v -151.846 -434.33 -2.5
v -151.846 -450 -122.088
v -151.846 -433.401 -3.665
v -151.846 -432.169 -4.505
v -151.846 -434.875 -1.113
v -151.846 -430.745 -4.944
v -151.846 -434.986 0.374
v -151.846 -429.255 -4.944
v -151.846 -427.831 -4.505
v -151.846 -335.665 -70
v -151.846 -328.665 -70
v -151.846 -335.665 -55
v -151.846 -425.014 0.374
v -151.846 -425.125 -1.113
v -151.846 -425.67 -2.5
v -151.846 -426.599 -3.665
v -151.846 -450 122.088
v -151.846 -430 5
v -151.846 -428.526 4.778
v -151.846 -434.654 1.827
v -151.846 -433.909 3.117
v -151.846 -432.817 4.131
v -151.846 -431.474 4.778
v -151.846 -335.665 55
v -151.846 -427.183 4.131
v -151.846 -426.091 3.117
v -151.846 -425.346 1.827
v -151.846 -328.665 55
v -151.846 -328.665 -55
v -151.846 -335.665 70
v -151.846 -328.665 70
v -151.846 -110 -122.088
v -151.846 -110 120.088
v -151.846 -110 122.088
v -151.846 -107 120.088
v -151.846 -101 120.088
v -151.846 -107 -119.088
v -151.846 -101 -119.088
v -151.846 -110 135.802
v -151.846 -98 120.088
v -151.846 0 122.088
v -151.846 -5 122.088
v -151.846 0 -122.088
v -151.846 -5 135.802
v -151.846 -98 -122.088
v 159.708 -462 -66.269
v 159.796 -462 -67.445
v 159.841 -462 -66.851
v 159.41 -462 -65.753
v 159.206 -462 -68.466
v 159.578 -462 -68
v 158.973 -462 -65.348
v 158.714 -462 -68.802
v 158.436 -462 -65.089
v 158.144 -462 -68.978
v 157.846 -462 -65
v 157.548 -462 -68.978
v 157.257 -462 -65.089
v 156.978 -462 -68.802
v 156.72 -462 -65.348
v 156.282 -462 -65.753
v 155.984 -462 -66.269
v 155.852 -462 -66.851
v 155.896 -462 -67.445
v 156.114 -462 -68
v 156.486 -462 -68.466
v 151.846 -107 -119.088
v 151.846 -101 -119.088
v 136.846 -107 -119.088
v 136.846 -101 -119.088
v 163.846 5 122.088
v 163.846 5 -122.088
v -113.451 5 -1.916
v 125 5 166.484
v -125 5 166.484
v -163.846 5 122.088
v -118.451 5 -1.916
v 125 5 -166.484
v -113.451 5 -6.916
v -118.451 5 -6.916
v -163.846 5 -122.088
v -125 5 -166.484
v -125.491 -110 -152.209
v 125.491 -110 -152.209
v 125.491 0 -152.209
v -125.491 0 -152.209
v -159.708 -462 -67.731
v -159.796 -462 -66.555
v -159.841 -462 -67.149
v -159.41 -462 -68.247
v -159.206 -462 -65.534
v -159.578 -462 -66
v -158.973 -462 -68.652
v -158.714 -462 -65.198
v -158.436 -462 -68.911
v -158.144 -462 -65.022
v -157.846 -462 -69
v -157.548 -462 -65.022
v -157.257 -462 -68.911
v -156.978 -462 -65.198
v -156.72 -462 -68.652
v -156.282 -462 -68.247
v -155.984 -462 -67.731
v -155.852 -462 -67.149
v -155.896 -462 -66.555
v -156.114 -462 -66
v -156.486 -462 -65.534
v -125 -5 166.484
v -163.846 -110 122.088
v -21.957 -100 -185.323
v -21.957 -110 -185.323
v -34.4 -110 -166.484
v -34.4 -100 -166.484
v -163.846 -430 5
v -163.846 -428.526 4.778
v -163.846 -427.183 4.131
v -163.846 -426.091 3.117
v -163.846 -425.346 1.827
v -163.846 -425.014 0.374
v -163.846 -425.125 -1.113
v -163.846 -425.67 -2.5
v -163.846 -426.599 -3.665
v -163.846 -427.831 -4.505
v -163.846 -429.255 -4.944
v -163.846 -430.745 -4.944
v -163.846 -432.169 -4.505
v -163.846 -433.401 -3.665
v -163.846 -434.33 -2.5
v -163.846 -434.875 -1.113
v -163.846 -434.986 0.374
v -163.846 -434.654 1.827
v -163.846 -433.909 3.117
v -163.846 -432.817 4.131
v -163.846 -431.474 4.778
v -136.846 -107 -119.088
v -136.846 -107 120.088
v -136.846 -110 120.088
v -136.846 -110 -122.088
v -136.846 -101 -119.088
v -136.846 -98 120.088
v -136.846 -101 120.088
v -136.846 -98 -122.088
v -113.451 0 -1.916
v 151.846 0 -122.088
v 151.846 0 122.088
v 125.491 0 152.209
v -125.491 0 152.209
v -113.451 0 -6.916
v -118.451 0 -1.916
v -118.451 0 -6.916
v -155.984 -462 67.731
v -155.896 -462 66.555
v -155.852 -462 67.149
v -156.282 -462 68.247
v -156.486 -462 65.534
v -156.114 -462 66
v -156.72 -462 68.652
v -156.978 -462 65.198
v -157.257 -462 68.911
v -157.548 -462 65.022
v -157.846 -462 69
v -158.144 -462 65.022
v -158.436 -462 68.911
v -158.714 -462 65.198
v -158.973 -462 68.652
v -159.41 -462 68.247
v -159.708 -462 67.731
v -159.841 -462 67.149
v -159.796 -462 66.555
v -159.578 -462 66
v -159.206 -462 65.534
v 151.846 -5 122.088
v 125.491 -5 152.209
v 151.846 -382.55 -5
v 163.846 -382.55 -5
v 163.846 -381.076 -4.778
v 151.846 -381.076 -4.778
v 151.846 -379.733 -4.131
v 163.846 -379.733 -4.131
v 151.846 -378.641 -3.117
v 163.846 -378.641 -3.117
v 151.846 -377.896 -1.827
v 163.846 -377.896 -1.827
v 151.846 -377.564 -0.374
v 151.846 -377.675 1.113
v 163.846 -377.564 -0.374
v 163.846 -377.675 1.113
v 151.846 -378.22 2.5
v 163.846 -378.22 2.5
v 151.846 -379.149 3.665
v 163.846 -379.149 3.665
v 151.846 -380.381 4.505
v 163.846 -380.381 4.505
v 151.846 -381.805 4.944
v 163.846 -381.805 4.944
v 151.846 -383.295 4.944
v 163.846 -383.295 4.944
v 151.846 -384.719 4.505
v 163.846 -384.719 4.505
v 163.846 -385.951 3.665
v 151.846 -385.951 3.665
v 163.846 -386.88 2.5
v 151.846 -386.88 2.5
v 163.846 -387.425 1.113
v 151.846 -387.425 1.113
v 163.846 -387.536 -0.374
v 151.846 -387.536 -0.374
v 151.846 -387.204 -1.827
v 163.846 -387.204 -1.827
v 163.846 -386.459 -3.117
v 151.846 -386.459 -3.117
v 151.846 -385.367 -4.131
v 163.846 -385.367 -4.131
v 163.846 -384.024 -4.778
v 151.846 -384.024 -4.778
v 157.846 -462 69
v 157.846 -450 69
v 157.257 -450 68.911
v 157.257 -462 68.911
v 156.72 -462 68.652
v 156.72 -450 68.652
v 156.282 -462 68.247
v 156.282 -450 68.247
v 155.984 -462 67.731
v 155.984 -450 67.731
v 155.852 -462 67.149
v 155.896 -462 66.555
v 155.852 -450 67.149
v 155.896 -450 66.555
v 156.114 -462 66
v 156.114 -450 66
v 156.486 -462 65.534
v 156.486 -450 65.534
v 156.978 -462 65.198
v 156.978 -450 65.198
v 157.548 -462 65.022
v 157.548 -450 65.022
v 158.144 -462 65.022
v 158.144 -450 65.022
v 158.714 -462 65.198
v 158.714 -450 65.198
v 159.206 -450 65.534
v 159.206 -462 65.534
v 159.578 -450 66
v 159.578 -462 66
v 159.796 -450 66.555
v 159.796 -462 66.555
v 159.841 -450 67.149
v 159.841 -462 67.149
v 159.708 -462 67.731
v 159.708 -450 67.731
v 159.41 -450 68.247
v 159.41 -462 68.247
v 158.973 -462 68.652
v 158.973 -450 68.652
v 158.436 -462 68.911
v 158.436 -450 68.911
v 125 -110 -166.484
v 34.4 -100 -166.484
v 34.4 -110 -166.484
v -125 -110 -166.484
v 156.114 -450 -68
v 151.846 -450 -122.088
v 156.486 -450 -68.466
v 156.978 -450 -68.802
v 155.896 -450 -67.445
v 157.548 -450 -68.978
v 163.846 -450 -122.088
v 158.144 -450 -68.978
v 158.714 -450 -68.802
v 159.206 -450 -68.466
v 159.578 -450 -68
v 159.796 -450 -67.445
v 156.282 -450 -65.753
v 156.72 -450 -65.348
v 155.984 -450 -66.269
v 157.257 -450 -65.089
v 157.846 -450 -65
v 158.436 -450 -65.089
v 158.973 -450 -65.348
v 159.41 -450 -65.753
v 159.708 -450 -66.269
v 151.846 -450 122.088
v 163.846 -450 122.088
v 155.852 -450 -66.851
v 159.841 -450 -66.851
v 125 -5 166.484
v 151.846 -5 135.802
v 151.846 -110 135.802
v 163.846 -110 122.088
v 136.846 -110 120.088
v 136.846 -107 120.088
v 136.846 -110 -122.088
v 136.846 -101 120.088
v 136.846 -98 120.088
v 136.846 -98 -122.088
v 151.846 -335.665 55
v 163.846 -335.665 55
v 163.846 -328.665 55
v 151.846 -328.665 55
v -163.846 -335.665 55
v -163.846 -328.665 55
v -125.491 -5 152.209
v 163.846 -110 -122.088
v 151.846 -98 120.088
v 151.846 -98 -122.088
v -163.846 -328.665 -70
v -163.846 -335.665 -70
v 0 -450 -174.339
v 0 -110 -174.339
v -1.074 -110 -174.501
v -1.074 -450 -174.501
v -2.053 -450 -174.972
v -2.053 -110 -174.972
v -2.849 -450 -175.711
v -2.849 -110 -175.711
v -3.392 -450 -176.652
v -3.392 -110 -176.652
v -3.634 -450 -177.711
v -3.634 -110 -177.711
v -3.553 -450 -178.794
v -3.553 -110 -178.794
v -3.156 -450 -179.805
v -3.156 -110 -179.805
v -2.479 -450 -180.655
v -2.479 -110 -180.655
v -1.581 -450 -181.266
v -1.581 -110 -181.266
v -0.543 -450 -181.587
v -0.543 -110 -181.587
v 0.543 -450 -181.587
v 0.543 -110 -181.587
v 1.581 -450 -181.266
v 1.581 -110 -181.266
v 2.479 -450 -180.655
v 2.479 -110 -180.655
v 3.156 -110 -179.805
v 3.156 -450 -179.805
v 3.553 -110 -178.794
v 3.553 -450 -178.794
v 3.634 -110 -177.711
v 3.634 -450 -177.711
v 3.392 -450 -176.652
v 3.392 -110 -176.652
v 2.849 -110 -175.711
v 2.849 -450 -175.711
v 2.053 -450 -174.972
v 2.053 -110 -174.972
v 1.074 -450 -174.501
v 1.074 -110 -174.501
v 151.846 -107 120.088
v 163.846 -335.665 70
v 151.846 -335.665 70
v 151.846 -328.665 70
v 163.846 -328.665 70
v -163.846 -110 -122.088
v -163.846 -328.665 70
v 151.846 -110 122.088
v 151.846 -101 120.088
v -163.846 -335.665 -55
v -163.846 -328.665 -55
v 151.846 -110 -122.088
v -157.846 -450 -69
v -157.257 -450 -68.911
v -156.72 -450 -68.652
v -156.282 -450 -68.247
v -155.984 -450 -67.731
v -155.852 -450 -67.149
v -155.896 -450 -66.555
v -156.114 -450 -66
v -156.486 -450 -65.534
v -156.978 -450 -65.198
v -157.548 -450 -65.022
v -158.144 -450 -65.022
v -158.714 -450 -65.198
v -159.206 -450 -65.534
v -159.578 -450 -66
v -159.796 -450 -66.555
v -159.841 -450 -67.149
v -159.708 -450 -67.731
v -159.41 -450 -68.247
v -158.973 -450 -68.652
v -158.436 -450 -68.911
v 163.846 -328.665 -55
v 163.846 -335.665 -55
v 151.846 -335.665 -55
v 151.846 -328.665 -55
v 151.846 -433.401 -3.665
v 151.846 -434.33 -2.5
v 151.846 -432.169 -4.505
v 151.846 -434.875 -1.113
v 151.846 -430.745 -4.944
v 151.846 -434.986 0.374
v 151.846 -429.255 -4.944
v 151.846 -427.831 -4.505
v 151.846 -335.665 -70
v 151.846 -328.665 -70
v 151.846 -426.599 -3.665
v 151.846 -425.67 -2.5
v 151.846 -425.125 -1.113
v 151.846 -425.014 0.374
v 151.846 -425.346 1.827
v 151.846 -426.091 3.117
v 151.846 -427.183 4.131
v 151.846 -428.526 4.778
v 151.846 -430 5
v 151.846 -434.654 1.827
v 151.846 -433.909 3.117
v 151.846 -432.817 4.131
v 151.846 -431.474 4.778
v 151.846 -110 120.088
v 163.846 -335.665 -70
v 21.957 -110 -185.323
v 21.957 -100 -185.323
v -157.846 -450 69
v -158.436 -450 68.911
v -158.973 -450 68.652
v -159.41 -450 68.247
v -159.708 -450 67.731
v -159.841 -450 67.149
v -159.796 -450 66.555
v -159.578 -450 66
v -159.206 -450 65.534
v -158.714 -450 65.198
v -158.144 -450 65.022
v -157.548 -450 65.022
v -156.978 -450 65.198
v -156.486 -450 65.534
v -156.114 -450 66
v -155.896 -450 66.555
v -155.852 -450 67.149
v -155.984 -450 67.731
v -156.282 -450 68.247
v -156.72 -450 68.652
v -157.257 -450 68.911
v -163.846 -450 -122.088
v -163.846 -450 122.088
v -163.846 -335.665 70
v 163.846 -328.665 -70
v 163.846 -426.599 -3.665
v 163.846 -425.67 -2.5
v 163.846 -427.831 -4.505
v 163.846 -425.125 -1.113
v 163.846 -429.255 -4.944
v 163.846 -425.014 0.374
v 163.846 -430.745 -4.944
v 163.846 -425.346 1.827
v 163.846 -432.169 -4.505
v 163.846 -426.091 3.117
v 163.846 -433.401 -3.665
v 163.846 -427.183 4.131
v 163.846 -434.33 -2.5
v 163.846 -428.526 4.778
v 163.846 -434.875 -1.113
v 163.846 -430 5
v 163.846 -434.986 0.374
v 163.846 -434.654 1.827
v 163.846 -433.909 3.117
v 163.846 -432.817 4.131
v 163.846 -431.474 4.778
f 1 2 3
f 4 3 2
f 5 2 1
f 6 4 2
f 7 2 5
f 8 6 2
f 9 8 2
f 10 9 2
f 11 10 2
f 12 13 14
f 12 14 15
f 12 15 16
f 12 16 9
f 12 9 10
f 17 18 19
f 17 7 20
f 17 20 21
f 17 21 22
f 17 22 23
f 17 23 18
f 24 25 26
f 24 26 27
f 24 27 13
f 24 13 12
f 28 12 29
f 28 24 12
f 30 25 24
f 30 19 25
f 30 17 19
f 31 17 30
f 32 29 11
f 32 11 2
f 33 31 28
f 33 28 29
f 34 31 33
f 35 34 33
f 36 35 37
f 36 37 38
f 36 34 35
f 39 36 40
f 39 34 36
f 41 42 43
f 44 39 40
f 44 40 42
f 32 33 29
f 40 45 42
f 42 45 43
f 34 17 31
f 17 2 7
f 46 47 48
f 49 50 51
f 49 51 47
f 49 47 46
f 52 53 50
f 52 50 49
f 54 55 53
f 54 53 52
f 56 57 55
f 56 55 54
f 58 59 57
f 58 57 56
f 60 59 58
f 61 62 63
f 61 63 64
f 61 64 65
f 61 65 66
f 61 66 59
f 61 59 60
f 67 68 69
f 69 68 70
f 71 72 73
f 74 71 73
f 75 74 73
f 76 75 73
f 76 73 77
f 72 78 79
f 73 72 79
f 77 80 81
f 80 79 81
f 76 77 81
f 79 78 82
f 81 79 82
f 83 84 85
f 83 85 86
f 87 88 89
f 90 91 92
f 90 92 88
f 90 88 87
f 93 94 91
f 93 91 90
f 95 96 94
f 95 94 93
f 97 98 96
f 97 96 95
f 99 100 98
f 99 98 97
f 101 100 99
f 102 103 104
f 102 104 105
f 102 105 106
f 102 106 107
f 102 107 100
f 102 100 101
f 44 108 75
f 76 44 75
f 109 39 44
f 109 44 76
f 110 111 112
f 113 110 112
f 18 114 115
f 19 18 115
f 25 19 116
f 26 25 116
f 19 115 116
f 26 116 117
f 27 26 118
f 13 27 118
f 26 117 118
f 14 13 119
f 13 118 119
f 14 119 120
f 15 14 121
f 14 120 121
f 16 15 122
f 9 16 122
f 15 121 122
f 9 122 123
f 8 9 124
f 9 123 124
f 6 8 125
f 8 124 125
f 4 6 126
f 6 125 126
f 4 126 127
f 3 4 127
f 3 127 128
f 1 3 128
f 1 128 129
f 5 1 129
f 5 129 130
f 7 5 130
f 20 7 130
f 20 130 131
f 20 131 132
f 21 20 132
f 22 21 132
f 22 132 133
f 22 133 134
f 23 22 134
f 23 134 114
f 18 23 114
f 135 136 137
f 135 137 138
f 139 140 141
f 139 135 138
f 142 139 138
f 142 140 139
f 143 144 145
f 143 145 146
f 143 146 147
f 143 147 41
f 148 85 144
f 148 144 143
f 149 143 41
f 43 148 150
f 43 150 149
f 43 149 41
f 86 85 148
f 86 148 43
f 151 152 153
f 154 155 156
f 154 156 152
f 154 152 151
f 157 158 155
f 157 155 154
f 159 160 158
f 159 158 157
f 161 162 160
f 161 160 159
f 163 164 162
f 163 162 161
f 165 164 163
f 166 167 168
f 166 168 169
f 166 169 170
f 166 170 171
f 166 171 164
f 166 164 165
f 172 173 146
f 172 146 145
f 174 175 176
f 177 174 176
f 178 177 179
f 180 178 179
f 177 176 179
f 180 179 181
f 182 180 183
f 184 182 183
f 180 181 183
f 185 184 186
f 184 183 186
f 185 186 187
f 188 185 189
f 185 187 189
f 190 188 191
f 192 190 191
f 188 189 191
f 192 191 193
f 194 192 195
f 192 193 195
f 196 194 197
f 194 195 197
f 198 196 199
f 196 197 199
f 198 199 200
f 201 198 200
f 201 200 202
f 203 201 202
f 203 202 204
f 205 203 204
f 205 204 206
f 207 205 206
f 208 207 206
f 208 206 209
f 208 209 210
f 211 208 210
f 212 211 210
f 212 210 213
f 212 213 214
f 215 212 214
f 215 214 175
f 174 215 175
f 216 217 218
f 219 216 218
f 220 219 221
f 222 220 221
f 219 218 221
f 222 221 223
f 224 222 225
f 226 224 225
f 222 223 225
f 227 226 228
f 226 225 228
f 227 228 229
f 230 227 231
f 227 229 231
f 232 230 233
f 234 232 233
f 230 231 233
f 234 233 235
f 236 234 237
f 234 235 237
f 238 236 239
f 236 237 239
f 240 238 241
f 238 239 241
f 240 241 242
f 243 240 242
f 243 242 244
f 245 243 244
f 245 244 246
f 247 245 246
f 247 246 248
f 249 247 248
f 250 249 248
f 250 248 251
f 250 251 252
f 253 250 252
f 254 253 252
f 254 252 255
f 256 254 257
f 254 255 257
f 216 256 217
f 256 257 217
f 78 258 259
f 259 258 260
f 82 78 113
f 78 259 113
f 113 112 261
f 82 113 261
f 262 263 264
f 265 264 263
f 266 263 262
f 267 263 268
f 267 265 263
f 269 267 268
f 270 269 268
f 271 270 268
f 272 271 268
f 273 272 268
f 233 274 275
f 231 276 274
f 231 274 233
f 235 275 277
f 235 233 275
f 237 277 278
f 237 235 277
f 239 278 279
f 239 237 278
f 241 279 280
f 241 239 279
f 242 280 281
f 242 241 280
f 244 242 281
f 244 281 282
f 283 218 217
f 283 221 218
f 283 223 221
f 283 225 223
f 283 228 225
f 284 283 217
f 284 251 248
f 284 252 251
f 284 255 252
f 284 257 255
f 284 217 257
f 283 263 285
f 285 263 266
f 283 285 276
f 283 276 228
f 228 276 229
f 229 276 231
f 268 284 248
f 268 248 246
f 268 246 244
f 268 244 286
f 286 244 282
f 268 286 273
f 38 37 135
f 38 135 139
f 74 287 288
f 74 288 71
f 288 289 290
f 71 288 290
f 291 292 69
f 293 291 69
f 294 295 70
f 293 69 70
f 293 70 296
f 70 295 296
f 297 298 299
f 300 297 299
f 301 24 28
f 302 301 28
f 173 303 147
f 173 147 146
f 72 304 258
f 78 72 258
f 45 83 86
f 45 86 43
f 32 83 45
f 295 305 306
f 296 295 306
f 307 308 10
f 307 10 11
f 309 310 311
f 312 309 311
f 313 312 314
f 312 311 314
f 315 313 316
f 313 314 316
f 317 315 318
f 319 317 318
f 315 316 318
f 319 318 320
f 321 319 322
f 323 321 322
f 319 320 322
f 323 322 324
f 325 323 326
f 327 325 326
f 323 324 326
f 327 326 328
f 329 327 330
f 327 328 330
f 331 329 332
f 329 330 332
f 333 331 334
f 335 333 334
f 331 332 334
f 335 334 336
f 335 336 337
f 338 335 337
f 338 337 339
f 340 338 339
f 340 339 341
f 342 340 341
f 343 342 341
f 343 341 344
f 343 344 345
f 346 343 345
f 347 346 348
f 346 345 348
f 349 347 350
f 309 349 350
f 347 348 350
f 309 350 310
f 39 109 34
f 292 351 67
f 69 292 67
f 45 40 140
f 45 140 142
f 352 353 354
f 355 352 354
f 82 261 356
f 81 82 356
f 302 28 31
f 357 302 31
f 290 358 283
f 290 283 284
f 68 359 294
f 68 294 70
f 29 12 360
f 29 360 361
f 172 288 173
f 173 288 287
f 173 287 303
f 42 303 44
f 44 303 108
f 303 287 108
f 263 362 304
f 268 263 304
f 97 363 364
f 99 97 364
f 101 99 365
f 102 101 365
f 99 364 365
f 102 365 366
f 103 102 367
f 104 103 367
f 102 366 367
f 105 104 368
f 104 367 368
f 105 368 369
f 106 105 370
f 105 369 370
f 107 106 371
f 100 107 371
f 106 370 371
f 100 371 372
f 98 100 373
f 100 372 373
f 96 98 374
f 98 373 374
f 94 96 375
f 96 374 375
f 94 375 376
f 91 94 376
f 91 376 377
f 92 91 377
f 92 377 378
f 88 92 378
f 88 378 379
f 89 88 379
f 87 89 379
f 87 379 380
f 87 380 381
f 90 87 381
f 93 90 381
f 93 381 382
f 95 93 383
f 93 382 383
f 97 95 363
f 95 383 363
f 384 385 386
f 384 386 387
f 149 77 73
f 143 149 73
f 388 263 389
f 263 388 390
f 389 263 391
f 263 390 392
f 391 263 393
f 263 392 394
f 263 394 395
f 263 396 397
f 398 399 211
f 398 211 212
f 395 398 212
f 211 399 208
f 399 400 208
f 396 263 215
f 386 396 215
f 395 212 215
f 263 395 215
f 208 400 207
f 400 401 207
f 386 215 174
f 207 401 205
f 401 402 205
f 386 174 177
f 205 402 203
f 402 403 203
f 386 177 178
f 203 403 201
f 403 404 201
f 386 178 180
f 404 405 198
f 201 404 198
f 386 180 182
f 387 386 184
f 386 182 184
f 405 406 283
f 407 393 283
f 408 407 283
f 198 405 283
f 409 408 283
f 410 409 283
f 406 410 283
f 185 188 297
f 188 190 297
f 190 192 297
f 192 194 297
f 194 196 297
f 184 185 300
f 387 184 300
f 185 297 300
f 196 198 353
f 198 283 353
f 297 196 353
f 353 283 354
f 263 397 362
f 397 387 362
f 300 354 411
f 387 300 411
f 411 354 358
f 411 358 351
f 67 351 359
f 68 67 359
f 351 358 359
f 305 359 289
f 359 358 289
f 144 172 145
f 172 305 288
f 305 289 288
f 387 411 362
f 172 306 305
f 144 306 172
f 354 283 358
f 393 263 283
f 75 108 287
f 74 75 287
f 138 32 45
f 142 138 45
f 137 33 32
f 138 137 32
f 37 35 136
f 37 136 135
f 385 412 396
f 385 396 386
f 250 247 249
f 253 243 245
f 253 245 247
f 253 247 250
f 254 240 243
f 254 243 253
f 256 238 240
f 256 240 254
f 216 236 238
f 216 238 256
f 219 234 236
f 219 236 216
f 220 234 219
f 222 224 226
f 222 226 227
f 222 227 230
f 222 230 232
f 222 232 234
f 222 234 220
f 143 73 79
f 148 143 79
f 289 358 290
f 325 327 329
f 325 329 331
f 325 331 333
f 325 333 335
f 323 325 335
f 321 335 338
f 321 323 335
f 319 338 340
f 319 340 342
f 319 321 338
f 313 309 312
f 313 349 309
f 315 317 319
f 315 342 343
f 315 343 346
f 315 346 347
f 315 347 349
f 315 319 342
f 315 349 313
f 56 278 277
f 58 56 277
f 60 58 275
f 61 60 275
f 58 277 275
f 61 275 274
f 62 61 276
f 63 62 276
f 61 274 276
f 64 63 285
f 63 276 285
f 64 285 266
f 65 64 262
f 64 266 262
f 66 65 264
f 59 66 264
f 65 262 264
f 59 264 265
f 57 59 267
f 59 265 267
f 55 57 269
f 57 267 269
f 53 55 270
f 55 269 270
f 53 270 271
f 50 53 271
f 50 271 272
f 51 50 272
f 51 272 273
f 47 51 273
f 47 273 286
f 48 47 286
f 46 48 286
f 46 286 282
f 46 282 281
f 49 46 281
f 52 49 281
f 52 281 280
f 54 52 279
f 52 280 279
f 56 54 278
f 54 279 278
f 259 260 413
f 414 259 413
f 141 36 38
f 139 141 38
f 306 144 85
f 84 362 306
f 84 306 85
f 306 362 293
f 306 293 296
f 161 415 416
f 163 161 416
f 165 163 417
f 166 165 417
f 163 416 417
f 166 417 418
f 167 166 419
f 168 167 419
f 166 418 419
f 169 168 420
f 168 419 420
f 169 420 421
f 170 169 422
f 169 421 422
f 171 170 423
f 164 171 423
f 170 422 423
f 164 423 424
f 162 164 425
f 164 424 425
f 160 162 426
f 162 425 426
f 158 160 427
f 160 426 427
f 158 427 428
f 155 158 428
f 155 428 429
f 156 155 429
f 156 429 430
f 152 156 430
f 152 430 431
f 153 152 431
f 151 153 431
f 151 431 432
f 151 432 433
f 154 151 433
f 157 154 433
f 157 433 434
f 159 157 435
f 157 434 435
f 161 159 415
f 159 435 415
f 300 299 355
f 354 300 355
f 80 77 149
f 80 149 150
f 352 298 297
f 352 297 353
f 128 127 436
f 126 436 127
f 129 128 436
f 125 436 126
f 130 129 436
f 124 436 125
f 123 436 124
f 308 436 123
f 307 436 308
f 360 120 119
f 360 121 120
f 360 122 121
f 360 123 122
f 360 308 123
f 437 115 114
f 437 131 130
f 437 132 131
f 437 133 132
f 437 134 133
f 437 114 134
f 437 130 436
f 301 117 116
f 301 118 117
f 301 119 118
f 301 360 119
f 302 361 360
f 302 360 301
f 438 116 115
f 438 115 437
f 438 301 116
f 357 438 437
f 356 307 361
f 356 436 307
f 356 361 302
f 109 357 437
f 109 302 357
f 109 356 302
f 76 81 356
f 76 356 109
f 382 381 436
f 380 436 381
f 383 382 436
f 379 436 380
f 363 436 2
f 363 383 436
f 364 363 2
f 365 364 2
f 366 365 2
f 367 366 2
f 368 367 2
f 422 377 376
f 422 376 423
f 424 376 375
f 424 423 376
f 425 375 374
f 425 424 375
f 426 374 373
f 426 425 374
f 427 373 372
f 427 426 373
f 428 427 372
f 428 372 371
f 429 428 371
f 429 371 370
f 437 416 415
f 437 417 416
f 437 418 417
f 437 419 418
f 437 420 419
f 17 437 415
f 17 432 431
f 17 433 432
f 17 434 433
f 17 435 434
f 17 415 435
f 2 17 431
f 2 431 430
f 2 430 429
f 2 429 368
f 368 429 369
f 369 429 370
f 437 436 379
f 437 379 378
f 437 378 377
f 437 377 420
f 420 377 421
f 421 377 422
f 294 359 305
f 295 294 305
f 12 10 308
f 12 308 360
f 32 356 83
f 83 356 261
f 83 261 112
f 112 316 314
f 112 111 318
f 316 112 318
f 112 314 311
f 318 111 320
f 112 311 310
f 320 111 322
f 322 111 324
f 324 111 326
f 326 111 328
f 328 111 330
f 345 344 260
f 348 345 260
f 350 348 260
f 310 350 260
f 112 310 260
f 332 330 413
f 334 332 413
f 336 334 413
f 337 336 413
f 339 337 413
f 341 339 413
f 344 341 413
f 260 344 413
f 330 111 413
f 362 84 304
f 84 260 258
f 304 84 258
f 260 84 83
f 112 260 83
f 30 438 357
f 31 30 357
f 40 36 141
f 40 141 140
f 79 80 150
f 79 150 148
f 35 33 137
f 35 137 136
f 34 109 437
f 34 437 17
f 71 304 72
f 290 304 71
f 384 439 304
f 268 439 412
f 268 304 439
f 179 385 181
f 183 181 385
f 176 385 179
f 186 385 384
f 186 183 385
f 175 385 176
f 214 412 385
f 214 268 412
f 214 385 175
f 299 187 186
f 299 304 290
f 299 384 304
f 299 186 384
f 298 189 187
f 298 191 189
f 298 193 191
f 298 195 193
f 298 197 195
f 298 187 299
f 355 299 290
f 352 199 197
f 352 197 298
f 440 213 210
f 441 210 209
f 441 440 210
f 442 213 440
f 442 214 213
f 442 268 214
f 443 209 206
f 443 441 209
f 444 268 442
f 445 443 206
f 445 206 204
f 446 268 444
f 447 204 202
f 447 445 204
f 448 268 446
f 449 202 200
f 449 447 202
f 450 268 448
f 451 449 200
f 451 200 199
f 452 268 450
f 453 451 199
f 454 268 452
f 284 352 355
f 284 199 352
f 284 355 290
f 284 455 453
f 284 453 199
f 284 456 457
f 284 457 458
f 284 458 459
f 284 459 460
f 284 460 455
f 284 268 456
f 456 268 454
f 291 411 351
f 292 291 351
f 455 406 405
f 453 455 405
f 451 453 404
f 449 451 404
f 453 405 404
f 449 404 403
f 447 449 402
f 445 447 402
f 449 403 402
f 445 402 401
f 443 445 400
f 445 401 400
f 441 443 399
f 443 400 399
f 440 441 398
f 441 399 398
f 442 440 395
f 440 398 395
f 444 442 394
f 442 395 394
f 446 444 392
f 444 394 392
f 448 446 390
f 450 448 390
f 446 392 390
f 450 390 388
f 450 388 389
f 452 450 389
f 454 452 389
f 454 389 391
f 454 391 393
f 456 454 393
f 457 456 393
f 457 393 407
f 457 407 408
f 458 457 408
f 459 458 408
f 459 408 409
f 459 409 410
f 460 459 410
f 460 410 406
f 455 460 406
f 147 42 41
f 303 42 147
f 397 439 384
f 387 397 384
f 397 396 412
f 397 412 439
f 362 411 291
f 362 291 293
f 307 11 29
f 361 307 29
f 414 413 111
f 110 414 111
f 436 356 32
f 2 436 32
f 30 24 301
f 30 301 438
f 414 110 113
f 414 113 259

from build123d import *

# Parameters (mm, degrees)
BOSS_EXTRU_1_DEPTH           = 5
ESQUISSE3_W                  = 12
ESQUISSE3_H                  = 244.175824176
BOSS_EXTRU_3_DEPTH           = 450
ESQUISSE4_R                  = 2
BOSS_EXTRU_6_DEPTH           = 12
ESQUISSE8_R                  = 5
ENL_V_MAT_EXTRU_2_DEPTH      = 416
BOSS_EXTRU_7_DEPTH           = 110
ENL_V_MAT_EXTRU_6_DEPTH      = 148
ENL_V_MAT_EXTRU_6_DEPTH_BACK = 101
ESQUISSE11_W                 = 303.692307692
ESQUISSE11_H                 = 114.198743449
ENL_V_MAT_EXTRU_8_DEPTH      = 666
ENL_V_MAT_EXTRU_8_DEPTH_BACK = 666
ESQUISSE12_W                 = 140
ESQUISSE12_H                 = 7
ESQUISSE16_W                 = 242.175824176
ESQUISSE16_H                 = 3
BOSS_EXTRU_8_DEPTH           = 15
ESQUISSE17_W                 = 3
ESQUISSE17_H                 = 12
BOSS_EXTRU_11_DEPTH          = 15
ESQUISSE19_W                 = 15
ESQUISSE19_H                 = 12
BOSS_EXTRU_12_DEPTH          = 3
ESQUISSE23_W                 = 110
ESQUISSE23_H                 = 7
BOSS_EXTRU_13_DEPTH          = 12
ESQUISSE24_W                 = 110
ESQUISSE24_H                 = 7
BOSS_EXTRU_14_DEPTH          = 12
ESQUISSE27_W                 = 10
ESQUISSE27_H                 = 338
BOSS_EXTRU_16_DEPTH          = 303.692307692
ESQUISSE28_W                 = 5
ESQUISSE28_H                 = 5
ENL_V_MAT_EXTRU_9_DEPTH      = 15
ESQUISSE29_R                 = 5
ENL_V_MAT_EXTRU_10_DEPTH     = 38
ESQUISSE30_W                 = 303.692307692
ESQUISSE30_H                 = 10
ENL_V_MAT_EXTRU_11_DEPTH     = 340
ESQUISSE31_W                 = 303.692307692
ESQUISSE31_H                 = 10
ENL_V_MAT_EXTRU_12_DEPTH     = 338
BOSS_EXTRU_18_DEPTH          = 10
ESQUISSE34_R                 = 3.644329392
BOSS_EXTRU_19_DEPTH          = 340


with BuildPart() as part:
    # Esquisse1 → Boss.-Extru.1 (new body)
    with BuildSketch(Plane(origin=(0, 0, 0), x_dir=(1, 0, 0), z_dir=(0, 1, 0))):
        Polygon((-125, 166.483516484), (125, 166.483516484), (163.846153846, 122.087912088), (163.846153846, -122.087912088), (125, -166.483516484), (-125, -166.483516484), (-163.846153846, -122.087912088), (-163.846153846, 122.087912088), align=None)
    extrude(amount=BOSS_EXTRU_1_DEPTH)

    # Esquisse3 → Boss.-Extru.3 (add)
    with BuildSketch(Plane.XZ):
        with Locations((-157.846153846, 0)):
            Rectangle(ESQUISSE3_W, ESQUISSE3_H)
        with Locations((157.846153846, 0)):
            Rectangle(ESQUISSE3_W, ESQUISSE3_H)
    extrude(amount=BOSS_EXTRU_3_DEPTH)

    # Esquisse4 → Boss.-Extru.6 (add)
    with BuildSketch(Plane.XZ.offset(450)):
        with Locations(Location((-157.846153846, 67, 0), (0, 0, 90))):
            Circle(ESQUISSE4_R)
        with Locations(Location((-157.846153846, -67, 0), (0, 0, 270))):
            Circle(ESQUISSE4_R)
        with Locations(Location((157.846153846, -67, 0), (0, 0, 90))):
            Circle(ESQUISSE4_R)
        with Locations(Location((157.846153846, 67, 0), (0, 0, 90))):
            Circle(ESQUISSE4_R)
    extrude(amount=BOSS_EXTRU_6_DEPTH)

    # Esquisse8 → Enlèv. mat.-Extru.2 (cut)
    with BuildSketch(Plane.ZY.offset(163.846153846)):
        with Locations((0, -430)):
            Circle(ESQUISSE8_R)
    extrude(amount=-ENL_V_MAT_EXTRU_2_DEPTH, mode=Mode.SUBTRACT)

    # Esquisse10 → Boss.-Extru.7 (add)
    with BuildSketch(Plane(origin=(0, -110, 0), x_dir=(-1, 0, 0), z_dir=(0, -1, 0))):
        Polygon((-163.846153846, 122.087912088), (-125, 166.483516484), (125, 166.483516484), (163.846153846, 122.087912088), (163.846153846, -122.087912088), (125, -166.483516484), (-125, -166.483516484), (-163.846153846, -122.087912088), align=None)
        Polygon((-151.846153846, -122.087912088), (-151.846153846, 122.087912088), (-125.490601914, 152.208542868), (125.490601914, 152.208542868), (151.846153846, 122.087912088), (151.846153846, -122.087912088), (125.490601914, -152.208542868), (-125.490601914, -152.208542868), align=None, mode=Mode.SUBTRACT)
    extrude(amount=-BOSS_EXTRU_7_DEPTH)

    # Esquisse11 → Enlèv. mat.-Extru.6 (cut, two sides: drawn at the far end of the back side and taken through both)
    with BuildSketch(Plane(origin=(0, 0, 152.208542868), x_dir=(-1, 0, 0), z_dir=(0, 0, -1)).offset(-ENL_V_MAT_EXTRU_6_DEPTH_BACK)):
        with Locations((0, -62.099371725)):
            Rectangle(ESQUISSE11_W, ESQUISSE11_H)
    extrude(amount=ENL_V_MAT_EXTRU_6_DEPTH + ENL_V_MAT_EXTRU_6_DEPTH_BACK, mode=Mode.SUBTRACT)

    # Esquisse12 → Enlèv. mat.-Extru.8 (cut, two sides: drawn at the far end of the back side and taken through both)
    with BuildSketch(Plane.ZY.offset(-151.846153846).offset(-ENL_V_MAT_EXTRU_8_DEPTH_BACK)):
        with Locations((0, -332.164926547)):
            Rectangle(ESQUISSE12_W, ESQUISSE12_H)
    extrude(amount=ENL_V_MAT_EXTRU_8_DEPTH + ENL_V_MAT_EXTRU_8_DEPTH_BACK, mode=Mode.SUBTRACT)

    # Esquisse16 → Boss.-Extru.8 (add)
    with BuildSketch(Plane(origin=(-151.846153846, 0, 0), x_dir=(0, 0, -1), z_dir=(1, 0, 0))):
        with Locations((1, -108.5)):
            Rectangle(ESQUISSE16_W, ESQUISSE16_H)
        with Locations((1, -99.5)):
            Rectangle(ESQUISSE16_W, ESQUISSE16_H)
    boss_extru_8 = extrude(amount=BOSS_EXTRU_8_DEPTH)

    # Esquisse17 → Boss.-Extru.11 (add)
    with BuildSketch(Plane(origin=(-136.846153846, 0, 0), x_dir=(0, 0, -1), z_dir=(1, 0, 0))):
        with Locations((120.587912088, -104)):
            Rectangle(ESQUISSE17_W, ESQUISSE17_H)
    extrude(amount=-BOSS_EXTRU_11_DEPTH)

    # Symétrie2: Boss.-Extru.8 across plane
    add(boss_extru_8.mirror(Plane(origin=(0, 0, 0), x_dir=(0, 0, 1), z_dir=(1, 0, 0))))

    # Esquisse19 → Boss.-Extru.12 (add)
    with BuildSketch(Plane(origin=(0, 0, -122.087912088), x_dir=(-1, 0, 0), z_dir=(0, 0, -1))):
        with Locations((-144.346153846, -104)):
            Rectangle(ESQUISSE19_W, ESQUISSE19_H)
    extrude(amount=-BOSS_EXTRU_12_DEPTH)

    # Esquisse23 → Boss.-Extru.13 (add)
    with BuildSketch(Plane(origin=(-151.846153846, 0, 0), x_dir=(0, 0, -1), z_dir=(1, 0, 0))):
        with Locations((0, -332.164926547)):
            Rectangle(ESQUISSE23_W, ESQUISSE23_H)
    extrude(amount=-BOSS_EXTRU_13_DEPTH)

    # Esquisse24 → Boss.-Extru.14 (add)
    with BuildSketch(Plane(origin=(163.846153846, 0, 0), x_dir=(0, 0, -1), z_dir=(1, 0, 0))):
        with Locations((0, -332.164926547)):
            Rectangle(ESQUISSE24_W, ESQUISSE24_H)
    extrude(amount=-BOSS_EXTRU_14_DEPTH)

    # Esquisse27 → Boss.-Extru.16 (add)
    with BuildSketch(Plane.ZY.offset(-151.846153846)):
        with Locations((-82.501488258, -281)):
            Rectangle(ESQUISSE27_W, ESQUISSE27_H)
    boss_extru_16 = extrude(amount=BOSS_EXTRU_16_DEPTH)

    # Symétrie4: Boss.-Extru.16 across plane
    add(boss_extru_16.mirror(Plane.XY))

    # Esquisse28 → Enlèv. mat.-Extru.9 (cut)
    with BuildSketch(Plane(origin=(0, 5, 0), x_dir=(1, 0, 0), z_dir=(0, 1, 0))):
        with Locations((-115.95070095, 4.416314077)):
            Rectangle(ESQUISSE28_W, ESQUISSE28_H)
    extrude(amount=-ENL_V_MAT_EXTRU_9_DEPTH, mode=Mode.SUBTRACT)

    # Esquisse29 → Enlèv. mat.-Extru.10 (cut)
    with BuildSketch(Plane(origin=(163.846153846, 0, 0), x_dir=(0, 0, -1), z_dir=(1, 0, 0))):
        with Locations((0, -382.55)):
            Circle(ESQUISSE29_R)
    extrude(amount=-ENL_V_MAT_EXTRU_10_DEPTH, mode=Mode.SUBTRACT)

    # Esquisse30 → Enlèv. mat.-Extru.11 (cut)
    with BuildSketch(Plane.XZ.offset(450)):
        with Locations((0, 82.501488258)):
            Rectangle(ESQUISSE30_W, ESQUISSE30_H)
    extrude(amount=-ENL_V_MAT_EXTRU_11_DEPTH, mode=Mode.SUBTRACT)

    # Esquisse31 → Enlèv. mat.-Extru.12 (cut)
    with BuildSketch(Plane.XZ.offset(450)):
        with Locations((0, -82.501488258)):
            Rectangle(ESQUISSE31_W, ESQUISSE31_H)
    extrude(amount=-ENL_V_MAT_EXTRU_12_DEPTH, mode=Mode.SUBTRACT)

    # Esquisse33 → Boss.-Extru.18 (add)
    with BuildSketch(Plane(origin=(0, -110, 0), x_dir=(-1, 0, 0), z_dir=(0, -1, 0))):
        Polygon((-21.957412763, 185.323052507), (21.957412763, 185.323052507), (34.400295625, 166.483516484), (-34.400295625, 166.483516484), align=None)
    extrude(amount=-BOSS_EXTRU_18_DEPTH)

    # Esquisse34 → Boss.-Extru.19 (add)
    with BuildSketch(Plane.XZ.offset(110)):
        with Locations(Location((0, -177.983018986, 0), (0, 0, 90))):
            Circle(ESQUISSE34_R)
    extrude(amount=BOSS_EXTRU_19_DEPTH)


solid = part.part
